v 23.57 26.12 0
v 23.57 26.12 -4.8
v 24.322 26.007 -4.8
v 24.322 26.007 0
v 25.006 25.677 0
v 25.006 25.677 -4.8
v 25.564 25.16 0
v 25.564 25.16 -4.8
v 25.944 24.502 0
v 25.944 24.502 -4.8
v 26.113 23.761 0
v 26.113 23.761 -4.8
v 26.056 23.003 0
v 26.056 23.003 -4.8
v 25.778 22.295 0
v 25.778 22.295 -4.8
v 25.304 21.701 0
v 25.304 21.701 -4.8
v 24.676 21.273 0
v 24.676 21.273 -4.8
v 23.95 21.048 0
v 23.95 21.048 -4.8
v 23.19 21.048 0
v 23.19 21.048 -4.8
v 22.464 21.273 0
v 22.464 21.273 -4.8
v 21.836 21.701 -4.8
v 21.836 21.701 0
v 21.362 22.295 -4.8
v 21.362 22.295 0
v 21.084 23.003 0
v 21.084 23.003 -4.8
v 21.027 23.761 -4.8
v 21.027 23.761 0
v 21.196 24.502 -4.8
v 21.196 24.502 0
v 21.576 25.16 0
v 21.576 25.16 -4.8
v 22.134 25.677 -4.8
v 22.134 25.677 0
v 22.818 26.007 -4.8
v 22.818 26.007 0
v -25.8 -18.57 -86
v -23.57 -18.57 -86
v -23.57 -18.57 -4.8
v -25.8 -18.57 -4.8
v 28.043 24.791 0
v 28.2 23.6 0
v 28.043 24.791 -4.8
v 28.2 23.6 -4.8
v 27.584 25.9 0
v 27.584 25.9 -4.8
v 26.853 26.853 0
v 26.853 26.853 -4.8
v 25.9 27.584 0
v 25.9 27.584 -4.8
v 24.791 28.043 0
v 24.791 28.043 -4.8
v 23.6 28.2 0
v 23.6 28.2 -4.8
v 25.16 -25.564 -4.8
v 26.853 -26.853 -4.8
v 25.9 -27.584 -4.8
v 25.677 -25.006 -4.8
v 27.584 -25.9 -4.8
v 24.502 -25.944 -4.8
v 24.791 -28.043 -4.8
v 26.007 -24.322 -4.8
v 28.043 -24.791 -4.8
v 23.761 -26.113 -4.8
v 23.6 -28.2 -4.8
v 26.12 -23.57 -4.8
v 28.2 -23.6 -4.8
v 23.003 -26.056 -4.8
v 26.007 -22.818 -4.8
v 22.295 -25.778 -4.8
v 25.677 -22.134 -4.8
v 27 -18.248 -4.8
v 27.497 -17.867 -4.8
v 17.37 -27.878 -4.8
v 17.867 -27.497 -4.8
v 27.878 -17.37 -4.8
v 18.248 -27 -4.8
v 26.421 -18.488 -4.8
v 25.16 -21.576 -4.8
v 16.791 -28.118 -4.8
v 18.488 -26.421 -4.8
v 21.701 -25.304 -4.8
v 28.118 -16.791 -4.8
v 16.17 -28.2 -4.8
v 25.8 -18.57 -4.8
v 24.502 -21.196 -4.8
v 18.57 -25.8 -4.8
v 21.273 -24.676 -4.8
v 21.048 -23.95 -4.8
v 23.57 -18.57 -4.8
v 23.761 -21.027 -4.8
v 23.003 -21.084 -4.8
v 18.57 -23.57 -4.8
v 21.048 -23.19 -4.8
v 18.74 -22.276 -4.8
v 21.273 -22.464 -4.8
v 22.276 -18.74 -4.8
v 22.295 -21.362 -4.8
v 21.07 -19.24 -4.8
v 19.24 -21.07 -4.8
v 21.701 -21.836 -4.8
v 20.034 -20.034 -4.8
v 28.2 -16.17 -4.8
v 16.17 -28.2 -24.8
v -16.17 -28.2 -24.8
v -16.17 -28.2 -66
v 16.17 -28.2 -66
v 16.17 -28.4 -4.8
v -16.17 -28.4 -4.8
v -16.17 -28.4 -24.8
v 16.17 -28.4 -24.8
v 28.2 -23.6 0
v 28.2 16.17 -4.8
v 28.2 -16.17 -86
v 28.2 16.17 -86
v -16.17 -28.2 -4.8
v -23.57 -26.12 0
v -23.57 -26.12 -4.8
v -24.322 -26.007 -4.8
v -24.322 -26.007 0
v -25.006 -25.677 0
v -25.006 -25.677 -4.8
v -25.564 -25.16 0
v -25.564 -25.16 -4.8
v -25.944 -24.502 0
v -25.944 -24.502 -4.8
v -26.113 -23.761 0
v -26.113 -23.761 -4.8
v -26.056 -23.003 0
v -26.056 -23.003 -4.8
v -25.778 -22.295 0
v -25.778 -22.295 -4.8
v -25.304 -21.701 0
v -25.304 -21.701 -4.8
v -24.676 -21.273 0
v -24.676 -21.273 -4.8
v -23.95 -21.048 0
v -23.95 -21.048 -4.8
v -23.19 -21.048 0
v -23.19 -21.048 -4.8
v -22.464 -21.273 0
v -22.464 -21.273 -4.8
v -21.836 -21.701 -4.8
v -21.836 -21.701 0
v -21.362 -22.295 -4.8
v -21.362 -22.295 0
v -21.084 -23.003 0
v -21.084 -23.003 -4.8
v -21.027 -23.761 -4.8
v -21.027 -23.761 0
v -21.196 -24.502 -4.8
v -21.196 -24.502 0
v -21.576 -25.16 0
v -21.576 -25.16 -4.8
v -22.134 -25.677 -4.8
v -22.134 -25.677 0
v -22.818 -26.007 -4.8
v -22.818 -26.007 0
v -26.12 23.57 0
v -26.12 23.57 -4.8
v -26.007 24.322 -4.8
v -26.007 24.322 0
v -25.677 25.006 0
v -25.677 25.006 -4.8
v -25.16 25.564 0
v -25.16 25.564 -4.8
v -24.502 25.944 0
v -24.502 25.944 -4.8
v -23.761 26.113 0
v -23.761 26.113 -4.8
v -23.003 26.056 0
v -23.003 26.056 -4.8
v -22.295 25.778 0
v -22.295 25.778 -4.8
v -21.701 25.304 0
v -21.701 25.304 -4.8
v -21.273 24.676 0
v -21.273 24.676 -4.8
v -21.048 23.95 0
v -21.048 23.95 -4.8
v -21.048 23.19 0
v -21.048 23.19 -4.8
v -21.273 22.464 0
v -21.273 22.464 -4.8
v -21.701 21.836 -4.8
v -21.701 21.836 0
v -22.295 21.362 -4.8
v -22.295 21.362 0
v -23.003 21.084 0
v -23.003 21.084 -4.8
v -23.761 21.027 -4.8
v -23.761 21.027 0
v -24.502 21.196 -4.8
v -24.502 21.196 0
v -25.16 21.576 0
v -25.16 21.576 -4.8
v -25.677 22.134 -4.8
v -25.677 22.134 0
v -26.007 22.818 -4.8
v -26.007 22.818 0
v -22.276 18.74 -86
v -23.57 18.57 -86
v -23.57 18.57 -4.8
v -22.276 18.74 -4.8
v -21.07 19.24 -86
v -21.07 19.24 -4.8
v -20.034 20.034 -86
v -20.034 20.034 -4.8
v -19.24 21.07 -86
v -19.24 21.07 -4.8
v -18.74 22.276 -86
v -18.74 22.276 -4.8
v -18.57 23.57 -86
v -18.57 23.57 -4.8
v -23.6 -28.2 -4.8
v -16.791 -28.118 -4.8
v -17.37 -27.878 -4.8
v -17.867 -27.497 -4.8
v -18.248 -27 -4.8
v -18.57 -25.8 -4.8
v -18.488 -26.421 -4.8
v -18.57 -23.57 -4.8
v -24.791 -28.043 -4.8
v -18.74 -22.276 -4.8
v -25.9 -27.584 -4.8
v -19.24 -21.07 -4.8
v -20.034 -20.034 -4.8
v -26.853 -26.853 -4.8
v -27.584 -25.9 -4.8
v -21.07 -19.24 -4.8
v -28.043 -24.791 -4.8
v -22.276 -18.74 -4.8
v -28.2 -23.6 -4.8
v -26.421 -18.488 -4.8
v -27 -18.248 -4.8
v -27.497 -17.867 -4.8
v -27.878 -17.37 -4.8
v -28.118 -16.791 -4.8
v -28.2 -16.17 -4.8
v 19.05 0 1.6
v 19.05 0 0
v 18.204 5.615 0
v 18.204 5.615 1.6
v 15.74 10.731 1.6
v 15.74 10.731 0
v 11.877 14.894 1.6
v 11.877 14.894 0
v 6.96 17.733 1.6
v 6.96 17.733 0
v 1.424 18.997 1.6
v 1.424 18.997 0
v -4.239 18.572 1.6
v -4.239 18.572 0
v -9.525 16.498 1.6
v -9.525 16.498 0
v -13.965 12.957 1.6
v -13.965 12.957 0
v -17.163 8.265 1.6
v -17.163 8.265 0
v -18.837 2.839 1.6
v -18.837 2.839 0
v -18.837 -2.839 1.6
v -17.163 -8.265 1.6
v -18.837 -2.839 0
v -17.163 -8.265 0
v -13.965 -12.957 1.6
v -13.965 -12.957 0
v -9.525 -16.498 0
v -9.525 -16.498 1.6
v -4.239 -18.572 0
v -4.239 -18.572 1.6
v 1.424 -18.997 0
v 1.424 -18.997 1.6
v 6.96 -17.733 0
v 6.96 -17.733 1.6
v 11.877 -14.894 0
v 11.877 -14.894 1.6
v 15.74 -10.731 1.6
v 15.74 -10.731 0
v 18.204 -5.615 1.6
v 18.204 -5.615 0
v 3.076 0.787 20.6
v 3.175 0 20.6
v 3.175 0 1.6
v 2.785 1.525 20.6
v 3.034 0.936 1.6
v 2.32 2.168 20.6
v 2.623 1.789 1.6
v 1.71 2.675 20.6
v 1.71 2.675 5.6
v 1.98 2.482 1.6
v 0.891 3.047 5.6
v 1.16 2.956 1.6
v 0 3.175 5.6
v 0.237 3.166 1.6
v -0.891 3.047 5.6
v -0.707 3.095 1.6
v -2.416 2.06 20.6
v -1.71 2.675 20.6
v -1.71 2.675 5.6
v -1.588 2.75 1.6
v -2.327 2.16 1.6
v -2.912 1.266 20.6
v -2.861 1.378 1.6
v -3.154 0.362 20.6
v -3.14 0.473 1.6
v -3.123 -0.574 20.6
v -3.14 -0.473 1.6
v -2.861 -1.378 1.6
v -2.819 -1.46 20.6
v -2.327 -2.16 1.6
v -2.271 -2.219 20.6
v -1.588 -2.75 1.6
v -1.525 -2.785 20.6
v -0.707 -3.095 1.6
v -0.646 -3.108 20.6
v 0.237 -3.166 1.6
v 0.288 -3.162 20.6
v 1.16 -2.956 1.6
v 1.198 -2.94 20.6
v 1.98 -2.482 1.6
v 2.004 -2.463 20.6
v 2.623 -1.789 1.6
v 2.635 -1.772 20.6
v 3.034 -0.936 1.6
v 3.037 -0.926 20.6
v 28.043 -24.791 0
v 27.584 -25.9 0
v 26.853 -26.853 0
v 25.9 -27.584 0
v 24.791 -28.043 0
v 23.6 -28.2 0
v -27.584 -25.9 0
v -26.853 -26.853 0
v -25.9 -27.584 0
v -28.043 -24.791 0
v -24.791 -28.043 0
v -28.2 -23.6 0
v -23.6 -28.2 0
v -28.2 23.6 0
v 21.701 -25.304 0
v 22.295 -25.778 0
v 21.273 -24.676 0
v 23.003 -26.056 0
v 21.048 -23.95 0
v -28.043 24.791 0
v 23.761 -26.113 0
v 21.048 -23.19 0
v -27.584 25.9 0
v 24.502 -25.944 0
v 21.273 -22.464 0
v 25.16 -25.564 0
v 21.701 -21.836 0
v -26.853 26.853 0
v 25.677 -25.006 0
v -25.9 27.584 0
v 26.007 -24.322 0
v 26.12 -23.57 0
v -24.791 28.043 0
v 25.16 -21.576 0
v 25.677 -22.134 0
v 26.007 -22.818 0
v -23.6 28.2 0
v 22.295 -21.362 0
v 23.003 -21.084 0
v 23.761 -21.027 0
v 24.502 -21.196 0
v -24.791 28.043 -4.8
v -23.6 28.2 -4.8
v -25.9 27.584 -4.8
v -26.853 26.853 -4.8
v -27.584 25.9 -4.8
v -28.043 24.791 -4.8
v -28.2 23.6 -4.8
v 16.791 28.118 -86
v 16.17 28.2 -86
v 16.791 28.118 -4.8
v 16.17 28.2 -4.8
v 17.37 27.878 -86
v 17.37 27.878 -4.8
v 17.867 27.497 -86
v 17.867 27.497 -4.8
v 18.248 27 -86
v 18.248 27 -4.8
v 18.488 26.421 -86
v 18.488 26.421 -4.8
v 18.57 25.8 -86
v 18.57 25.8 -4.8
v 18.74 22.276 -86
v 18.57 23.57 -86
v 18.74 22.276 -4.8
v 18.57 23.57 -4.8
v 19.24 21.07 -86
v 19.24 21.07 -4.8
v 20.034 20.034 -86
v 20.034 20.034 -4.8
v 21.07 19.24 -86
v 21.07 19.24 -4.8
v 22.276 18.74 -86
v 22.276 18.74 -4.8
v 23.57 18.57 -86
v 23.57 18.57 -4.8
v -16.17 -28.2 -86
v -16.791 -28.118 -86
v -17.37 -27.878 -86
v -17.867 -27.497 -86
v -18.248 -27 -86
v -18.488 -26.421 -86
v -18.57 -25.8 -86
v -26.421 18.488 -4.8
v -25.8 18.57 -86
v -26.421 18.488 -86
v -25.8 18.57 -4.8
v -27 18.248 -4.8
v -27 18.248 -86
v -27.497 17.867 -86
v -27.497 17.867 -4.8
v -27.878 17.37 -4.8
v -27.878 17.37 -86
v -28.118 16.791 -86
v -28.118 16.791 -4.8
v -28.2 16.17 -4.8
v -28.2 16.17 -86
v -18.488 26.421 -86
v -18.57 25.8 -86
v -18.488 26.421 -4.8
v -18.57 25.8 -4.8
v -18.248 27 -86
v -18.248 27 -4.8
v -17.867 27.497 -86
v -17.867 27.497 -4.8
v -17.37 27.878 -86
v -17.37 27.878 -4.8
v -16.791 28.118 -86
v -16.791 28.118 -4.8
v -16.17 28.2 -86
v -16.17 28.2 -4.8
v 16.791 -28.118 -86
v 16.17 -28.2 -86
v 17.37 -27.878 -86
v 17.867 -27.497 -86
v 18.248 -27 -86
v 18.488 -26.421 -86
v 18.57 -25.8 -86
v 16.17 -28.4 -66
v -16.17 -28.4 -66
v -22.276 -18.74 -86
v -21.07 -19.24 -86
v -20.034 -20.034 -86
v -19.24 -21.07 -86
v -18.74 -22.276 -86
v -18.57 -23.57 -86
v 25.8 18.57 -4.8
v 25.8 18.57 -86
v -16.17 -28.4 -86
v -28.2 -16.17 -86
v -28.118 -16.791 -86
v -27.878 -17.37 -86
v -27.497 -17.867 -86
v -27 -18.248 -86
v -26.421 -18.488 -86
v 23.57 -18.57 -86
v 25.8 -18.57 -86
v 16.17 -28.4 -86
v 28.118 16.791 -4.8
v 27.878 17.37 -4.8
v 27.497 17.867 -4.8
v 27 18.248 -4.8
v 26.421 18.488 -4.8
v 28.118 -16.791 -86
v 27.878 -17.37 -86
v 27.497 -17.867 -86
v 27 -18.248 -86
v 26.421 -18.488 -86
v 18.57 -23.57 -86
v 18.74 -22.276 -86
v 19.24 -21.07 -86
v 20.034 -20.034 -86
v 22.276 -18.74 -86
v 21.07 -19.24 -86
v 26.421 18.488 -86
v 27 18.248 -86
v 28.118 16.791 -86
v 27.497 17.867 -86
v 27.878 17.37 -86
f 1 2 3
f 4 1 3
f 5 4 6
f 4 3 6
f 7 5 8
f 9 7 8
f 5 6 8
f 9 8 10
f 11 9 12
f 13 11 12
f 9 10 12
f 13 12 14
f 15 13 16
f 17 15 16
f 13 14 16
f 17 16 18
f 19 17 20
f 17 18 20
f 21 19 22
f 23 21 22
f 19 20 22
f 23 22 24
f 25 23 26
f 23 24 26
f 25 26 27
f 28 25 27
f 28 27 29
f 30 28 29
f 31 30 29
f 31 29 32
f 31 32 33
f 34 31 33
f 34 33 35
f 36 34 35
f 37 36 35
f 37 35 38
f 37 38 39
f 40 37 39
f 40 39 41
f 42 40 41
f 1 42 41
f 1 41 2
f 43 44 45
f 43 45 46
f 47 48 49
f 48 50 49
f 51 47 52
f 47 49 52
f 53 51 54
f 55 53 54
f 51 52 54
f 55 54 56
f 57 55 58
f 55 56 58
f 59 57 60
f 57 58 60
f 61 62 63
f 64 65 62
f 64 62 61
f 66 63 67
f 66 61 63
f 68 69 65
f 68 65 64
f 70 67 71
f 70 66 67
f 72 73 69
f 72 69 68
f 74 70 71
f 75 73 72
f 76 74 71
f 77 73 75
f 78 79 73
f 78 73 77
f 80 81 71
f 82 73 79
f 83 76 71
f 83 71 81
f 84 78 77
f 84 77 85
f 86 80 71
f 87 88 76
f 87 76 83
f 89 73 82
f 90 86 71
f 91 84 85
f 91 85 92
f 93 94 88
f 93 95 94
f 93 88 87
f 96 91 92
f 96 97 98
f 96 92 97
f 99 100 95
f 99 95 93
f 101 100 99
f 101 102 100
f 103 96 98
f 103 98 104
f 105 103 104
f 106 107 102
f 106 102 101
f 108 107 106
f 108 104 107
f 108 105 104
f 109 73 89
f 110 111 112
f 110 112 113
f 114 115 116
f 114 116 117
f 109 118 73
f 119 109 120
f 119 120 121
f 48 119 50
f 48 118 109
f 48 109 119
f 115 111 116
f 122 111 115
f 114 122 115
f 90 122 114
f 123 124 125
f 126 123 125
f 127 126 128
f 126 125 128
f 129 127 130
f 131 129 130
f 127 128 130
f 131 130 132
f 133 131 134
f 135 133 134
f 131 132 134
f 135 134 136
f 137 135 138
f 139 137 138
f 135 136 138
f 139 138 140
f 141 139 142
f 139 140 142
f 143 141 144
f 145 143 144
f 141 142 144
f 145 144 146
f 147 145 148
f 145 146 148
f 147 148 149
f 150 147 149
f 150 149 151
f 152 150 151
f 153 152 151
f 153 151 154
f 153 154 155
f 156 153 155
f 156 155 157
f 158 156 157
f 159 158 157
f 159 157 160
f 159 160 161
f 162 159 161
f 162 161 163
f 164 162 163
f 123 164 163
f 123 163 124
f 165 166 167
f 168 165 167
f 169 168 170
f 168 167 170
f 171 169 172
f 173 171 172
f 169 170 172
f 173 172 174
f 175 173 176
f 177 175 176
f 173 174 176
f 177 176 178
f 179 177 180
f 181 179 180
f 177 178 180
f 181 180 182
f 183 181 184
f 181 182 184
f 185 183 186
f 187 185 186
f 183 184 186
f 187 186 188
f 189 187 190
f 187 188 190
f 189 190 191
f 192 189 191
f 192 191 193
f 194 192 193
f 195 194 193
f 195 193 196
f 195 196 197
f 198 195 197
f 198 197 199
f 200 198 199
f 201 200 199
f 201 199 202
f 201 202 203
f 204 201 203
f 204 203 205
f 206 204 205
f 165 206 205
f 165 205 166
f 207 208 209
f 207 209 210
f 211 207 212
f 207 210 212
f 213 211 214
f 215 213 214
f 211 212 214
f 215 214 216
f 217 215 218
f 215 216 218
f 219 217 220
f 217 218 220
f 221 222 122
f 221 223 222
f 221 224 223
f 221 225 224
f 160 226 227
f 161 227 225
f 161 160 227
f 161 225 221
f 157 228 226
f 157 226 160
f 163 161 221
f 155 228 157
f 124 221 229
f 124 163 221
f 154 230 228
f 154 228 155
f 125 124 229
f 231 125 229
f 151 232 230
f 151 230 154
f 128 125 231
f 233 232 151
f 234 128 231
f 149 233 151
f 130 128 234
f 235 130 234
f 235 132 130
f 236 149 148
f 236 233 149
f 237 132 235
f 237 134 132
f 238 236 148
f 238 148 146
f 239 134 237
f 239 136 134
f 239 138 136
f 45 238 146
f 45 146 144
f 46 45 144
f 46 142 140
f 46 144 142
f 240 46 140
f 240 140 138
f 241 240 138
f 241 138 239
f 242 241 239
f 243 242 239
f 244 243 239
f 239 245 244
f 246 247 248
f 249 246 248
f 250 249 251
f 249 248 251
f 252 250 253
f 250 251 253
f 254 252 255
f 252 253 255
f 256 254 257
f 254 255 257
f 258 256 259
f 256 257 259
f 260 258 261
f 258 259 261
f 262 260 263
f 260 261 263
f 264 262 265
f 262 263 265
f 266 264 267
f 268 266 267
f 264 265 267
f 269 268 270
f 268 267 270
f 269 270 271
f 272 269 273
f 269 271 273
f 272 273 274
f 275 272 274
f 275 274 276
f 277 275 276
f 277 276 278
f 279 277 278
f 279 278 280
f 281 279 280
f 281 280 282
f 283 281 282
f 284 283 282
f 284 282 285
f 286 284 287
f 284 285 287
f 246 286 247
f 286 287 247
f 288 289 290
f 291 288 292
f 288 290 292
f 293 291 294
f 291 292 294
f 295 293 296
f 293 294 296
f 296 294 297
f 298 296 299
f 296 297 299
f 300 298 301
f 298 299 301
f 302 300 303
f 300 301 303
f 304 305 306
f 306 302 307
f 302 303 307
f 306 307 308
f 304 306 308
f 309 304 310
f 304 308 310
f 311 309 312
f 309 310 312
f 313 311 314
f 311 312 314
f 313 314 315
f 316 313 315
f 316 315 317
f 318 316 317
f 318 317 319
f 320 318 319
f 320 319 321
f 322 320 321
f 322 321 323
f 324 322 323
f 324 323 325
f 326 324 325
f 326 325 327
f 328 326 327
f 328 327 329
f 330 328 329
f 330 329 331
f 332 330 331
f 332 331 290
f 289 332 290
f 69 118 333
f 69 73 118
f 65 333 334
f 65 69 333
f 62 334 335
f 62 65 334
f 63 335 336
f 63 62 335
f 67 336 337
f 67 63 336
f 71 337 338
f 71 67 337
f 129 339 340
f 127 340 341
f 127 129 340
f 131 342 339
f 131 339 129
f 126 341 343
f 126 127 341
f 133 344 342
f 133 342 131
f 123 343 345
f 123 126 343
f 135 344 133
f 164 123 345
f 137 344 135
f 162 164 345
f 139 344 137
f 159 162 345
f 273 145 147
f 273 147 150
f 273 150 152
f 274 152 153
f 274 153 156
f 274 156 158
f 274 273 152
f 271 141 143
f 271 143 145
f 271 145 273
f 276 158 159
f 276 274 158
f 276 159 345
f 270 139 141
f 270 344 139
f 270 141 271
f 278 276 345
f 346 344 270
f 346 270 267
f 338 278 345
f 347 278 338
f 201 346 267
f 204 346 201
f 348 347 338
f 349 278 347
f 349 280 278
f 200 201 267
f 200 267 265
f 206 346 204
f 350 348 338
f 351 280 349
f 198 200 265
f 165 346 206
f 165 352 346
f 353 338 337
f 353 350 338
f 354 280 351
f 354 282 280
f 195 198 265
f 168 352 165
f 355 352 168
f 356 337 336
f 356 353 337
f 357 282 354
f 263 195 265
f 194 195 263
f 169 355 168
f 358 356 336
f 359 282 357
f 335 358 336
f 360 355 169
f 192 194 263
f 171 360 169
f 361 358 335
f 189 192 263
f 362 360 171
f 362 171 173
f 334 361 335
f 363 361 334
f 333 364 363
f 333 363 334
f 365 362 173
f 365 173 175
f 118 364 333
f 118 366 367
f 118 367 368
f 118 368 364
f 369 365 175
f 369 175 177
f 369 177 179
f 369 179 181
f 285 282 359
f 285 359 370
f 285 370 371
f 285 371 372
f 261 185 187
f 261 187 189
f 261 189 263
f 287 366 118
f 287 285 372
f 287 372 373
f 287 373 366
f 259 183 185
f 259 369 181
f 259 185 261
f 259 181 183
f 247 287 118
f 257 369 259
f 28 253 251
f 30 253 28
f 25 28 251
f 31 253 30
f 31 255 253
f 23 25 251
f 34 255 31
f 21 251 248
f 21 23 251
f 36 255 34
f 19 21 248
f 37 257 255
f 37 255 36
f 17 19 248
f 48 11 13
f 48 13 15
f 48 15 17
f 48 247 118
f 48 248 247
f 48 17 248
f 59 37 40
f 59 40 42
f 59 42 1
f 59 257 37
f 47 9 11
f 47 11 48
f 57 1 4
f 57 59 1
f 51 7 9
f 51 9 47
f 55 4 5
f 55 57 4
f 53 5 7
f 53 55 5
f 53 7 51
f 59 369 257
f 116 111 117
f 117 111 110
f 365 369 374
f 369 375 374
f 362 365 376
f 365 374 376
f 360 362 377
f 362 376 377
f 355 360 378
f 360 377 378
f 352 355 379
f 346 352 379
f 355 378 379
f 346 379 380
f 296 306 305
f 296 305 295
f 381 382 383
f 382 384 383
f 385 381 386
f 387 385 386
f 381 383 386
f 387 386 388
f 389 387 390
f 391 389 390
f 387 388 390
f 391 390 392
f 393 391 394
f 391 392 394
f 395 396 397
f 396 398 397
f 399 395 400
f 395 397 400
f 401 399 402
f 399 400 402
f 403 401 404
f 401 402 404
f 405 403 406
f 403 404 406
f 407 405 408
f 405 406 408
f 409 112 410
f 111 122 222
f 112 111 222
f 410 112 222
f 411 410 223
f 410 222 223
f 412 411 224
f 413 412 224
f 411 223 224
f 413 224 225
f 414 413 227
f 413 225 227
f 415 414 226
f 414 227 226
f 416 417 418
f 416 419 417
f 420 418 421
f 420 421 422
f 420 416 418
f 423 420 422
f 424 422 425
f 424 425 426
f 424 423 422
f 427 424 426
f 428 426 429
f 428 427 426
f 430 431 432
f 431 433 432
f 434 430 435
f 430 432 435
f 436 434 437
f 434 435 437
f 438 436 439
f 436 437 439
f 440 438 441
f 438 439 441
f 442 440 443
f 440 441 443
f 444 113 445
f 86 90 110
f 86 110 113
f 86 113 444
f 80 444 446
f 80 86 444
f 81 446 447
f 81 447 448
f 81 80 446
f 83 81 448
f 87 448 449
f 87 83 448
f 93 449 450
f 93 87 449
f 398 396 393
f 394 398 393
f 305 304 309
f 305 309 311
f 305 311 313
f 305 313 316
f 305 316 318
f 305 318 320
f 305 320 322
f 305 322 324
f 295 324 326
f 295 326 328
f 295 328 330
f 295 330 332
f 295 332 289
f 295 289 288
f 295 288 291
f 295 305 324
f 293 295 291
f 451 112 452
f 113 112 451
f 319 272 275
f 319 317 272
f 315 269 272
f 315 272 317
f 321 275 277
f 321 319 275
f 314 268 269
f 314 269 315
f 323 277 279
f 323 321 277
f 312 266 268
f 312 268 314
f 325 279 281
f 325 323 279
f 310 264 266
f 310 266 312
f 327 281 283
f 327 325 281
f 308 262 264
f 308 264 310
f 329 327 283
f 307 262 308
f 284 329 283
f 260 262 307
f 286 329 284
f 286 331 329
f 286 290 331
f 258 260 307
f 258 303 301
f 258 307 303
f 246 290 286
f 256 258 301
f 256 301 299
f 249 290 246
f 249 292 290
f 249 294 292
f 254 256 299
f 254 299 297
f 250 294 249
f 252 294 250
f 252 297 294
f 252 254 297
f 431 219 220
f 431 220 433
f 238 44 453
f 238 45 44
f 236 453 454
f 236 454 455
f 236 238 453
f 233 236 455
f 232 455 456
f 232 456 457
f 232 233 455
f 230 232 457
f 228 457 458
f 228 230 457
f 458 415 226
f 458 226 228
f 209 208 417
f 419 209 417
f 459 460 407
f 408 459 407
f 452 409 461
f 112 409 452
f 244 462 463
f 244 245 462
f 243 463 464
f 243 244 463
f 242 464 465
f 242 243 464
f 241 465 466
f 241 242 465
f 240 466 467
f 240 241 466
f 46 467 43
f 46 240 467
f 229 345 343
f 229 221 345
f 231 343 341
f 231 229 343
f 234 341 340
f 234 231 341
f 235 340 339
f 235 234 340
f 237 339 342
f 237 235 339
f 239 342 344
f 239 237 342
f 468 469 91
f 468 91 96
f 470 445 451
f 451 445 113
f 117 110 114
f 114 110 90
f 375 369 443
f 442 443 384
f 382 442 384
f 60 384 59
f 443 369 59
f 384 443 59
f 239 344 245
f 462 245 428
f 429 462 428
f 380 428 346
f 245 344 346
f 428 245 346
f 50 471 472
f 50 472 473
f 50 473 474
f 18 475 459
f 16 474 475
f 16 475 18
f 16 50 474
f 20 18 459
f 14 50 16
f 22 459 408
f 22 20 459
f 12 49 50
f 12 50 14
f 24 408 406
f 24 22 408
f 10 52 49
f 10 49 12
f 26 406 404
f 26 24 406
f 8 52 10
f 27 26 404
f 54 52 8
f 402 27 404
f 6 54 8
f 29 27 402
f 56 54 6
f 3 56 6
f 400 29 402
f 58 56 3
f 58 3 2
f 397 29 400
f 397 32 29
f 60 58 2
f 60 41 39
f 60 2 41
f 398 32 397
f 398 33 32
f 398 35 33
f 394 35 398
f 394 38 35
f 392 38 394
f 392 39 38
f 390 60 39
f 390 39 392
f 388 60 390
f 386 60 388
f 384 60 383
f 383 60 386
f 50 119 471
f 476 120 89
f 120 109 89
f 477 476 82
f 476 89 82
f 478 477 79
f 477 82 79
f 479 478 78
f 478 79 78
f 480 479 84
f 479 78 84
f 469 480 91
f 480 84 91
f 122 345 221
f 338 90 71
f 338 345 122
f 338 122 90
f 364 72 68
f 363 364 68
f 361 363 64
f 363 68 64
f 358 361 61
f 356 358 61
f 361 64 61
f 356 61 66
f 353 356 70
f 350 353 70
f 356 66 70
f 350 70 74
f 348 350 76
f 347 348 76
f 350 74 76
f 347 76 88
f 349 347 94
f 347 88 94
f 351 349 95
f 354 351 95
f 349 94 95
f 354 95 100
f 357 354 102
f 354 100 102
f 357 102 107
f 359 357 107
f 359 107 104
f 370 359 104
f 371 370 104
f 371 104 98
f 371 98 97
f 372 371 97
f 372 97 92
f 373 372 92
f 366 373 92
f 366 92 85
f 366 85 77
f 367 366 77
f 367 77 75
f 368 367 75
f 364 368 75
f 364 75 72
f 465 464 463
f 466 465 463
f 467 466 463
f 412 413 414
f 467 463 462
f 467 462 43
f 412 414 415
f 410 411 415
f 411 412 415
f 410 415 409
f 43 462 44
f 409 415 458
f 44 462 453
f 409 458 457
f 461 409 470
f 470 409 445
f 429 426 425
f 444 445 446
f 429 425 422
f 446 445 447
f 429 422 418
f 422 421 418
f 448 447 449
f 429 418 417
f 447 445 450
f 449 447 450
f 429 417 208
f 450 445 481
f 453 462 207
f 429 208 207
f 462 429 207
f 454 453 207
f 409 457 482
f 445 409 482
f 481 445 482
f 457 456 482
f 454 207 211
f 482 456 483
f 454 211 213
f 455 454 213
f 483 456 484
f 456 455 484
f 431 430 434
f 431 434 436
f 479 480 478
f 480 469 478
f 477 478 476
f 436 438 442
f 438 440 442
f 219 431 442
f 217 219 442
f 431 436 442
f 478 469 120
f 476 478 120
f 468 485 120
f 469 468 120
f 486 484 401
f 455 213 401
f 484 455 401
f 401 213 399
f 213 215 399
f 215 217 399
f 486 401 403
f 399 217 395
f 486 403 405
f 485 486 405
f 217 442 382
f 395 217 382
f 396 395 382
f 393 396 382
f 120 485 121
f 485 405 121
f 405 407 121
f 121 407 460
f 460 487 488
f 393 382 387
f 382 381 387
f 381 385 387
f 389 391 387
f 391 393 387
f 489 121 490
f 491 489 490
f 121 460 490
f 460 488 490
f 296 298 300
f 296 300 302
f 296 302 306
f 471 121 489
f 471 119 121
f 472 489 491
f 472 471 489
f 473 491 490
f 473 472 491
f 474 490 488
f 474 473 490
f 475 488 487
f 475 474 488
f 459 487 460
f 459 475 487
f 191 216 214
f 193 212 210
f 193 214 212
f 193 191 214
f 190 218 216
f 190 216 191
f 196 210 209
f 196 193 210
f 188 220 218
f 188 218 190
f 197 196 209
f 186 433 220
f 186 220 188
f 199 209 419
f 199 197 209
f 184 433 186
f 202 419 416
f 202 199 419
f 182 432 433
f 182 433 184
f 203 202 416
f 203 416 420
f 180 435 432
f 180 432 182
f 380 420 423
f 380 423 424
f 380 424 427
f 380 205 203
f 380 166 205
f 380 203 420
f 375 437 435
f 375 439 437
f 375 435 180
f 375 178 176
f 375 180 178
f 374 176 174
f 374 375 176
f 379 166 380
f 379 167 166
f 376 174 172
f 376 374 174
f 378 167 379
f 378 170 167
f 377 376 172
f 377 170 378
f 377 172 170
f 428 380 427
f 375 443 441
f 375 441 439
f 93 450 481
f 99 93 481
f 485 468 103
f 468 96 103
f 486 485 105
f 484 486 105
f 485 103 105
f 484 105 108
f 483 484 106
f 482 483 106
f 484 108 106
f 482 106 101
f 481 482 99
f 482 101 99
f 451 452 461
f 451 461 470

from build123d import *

# Parameters (mm, degrees)
SKETCH1_W                  = 56.4
SKETCH1_H                  = 56.4
BOSS_EXTRUDE1_DEPTH        = 86
SKETCH2_W                  = 9.63
SKETCH2_H                  = 9.63
CUT_EXTRUDE1_DEPTH         = 81.2
FILLET1_R                  = 5
FILLET2_R                  = 2.4
FILLET3_R                  = 4.6
F_5_1_5_1_DIAMETER_HOLE1_D = 5.1
CIRPATTERN1_COUNT          = 4
SKETCH7_R                  = 19.05
BOSS_EXTRUDE2_DEPTH        = 1.6
SKETCH8_R                  = 3.175
BOSS_EXTRUDE3_DEPTH        = 19
CUT_EXTRUDE2_START         = -15
CUT_EXTRUDE2_DEPTH         = 15
SKETCH11_W                 = 32.34
SKETCH11_H                 = 20
BOSS_EXTRUDE4_DEPTH        = 0.2


with BuildPart() as part:
    # Sketch1 → Boss-Extrude1 (new body)
    with BuildSketch(Plane.XY):
        Rectangle(SKETCH1_W, SKETCH1_H)
    extrude(amount=-BOSS_EXTRUDE1_DEPTH)

    # Sketch2 → Cut-Extrude1 (cut)
    with BuildSketch(Plane(origin=(0, 0, -86), x_dir=(-1, 0, 0), z_dir=(0, 0, -1))):
        with Locations((23.385, 23.385)):
            Rectangle(SKETCH2_W, SKETCH2_H)
        with Locations((-23.385, 23.385)):
            Rectangle(SKETCH2_W, SKETCH2_H)
        with Locations((23.385, -23.385)):
            Rectangle(SKETCH2_W, SKETCH2_H)
        with Locations((-23.385, -23.385)):
            Rectangle(SKETCH2_W, SKETCH2_H)
    extrude(amount=-CUT_EXTRUDE1_DEPTH, mode=Mode.SUBTRACT)

    # Fillet1
    fillet1_edges = [part.edges().sort_by_distance(p)[0] for p in [
        (18.57, -18.57, -45.4),
        (-18.57, -18.57, -45.4),
        (-18.57, 18.57, -45.4),
        (18.57, 18.57, -45.4),
    ]]
    fillet(fillet1_edges, radius=FILLET1_R)

    # Fillet2
    fillet2_edges = [part.edges().sort_by_distance(p)[0] for p in [
        (18.57, -28.2, -45.4),
        (28.2, -18.57, -45.4),
        (-28.2, -18.57, -45.4),
        (-18.57, -28.2, -45.4),
        (-18.57, 28.2, -45.4),
        (-28.2, 18.57, -45.4),
        (28.2, 18.57, -45.4),
        (18.57, 28.2, -45.4),
    ]]
    fillet(fillet2_edges, radius=FILLET2_R)

    # Fillet3
    fillet3_edges = [part.edges().sort_by_distance(p)[0] for p in [
        (28.2, 28.2, -2.4),
        (-28.2, 28.2, -2.4),
        (-28.2, -28.2, -2.4),
        (28.2, -28.2, -2.4),
    ]]
    fillet(fillet3_edges, radius=FILLET3_R)

    # Ø5.1 (5.1) Diameter Hole1 (through all)
    with Locations(Plane.XY):
        with Locations((-23.57, 23.57)):
            f_5_1_5_1_diameter_hole1 = Hole(F_5_1_5_1_DIAMETER_HOLE1_D / 2)

    # CirPattern1: Ø5.1 (5.1) Diameter Hole1 ×4 about axis
    cirpattern1_axis = Axis((0, 0, 0), (0, 0, 1))
    for i in range(1, CIRPATTERN1_COUNT):
        add(f_5_1_5_1_diameter_hole1.rotate(cirpattern1_axis, i * 360 / CIRPATTERN1_COUNT), mode=Mode.SUBTRACT)

    # Sketch7 → Boss-Extrude2 (add)
    with BuildSketch(Plane.XY):
        Circle(SKETCH7_R)
    extrude(amount=BOSS_EXTRUDE2_DEPTH)

    # Sketch8 → Boss-Extrude3 (add)
    with BuildSketch(Plane.XY.offset(1.6)):
        Circle(SKETCH8_R)
    extrude(amount=BOSS_EXTRUDE3_DEPTH)

    # Sketch9 → Cut-Extrude2 (cut)
    with BuildSketch(Plane.XY.offset(20.6).offset(CUT_EXTRUDE2_START)):
        with BuildLine():
            Line((-1.71, 2.675168219), (1.71, 2.675168219))
            ThreePointArc((1.71, 2.675168219), (0, 3.175), (-1.71, 2.675168219))
        make_face()
    extrude(amount=CUT_EXTRUDE2_DEPTH, mode=Mode.SUBTRACT)

    # Sketch11 → Boss-Extrude4 (add)
    with BuildSketch(Plane.XZ.offset(28.2)):
        with Locations((0, -76)):
            Rectangle(SKETCH11_W, SKETCH11_H)
        with Locations((0, -14.8)):
            Rectangle(SKETCH11_W, SKETCH11_H)
    extrude(amount=BOSS_EXTRUDE4_DEPTH)


solid = part.part
